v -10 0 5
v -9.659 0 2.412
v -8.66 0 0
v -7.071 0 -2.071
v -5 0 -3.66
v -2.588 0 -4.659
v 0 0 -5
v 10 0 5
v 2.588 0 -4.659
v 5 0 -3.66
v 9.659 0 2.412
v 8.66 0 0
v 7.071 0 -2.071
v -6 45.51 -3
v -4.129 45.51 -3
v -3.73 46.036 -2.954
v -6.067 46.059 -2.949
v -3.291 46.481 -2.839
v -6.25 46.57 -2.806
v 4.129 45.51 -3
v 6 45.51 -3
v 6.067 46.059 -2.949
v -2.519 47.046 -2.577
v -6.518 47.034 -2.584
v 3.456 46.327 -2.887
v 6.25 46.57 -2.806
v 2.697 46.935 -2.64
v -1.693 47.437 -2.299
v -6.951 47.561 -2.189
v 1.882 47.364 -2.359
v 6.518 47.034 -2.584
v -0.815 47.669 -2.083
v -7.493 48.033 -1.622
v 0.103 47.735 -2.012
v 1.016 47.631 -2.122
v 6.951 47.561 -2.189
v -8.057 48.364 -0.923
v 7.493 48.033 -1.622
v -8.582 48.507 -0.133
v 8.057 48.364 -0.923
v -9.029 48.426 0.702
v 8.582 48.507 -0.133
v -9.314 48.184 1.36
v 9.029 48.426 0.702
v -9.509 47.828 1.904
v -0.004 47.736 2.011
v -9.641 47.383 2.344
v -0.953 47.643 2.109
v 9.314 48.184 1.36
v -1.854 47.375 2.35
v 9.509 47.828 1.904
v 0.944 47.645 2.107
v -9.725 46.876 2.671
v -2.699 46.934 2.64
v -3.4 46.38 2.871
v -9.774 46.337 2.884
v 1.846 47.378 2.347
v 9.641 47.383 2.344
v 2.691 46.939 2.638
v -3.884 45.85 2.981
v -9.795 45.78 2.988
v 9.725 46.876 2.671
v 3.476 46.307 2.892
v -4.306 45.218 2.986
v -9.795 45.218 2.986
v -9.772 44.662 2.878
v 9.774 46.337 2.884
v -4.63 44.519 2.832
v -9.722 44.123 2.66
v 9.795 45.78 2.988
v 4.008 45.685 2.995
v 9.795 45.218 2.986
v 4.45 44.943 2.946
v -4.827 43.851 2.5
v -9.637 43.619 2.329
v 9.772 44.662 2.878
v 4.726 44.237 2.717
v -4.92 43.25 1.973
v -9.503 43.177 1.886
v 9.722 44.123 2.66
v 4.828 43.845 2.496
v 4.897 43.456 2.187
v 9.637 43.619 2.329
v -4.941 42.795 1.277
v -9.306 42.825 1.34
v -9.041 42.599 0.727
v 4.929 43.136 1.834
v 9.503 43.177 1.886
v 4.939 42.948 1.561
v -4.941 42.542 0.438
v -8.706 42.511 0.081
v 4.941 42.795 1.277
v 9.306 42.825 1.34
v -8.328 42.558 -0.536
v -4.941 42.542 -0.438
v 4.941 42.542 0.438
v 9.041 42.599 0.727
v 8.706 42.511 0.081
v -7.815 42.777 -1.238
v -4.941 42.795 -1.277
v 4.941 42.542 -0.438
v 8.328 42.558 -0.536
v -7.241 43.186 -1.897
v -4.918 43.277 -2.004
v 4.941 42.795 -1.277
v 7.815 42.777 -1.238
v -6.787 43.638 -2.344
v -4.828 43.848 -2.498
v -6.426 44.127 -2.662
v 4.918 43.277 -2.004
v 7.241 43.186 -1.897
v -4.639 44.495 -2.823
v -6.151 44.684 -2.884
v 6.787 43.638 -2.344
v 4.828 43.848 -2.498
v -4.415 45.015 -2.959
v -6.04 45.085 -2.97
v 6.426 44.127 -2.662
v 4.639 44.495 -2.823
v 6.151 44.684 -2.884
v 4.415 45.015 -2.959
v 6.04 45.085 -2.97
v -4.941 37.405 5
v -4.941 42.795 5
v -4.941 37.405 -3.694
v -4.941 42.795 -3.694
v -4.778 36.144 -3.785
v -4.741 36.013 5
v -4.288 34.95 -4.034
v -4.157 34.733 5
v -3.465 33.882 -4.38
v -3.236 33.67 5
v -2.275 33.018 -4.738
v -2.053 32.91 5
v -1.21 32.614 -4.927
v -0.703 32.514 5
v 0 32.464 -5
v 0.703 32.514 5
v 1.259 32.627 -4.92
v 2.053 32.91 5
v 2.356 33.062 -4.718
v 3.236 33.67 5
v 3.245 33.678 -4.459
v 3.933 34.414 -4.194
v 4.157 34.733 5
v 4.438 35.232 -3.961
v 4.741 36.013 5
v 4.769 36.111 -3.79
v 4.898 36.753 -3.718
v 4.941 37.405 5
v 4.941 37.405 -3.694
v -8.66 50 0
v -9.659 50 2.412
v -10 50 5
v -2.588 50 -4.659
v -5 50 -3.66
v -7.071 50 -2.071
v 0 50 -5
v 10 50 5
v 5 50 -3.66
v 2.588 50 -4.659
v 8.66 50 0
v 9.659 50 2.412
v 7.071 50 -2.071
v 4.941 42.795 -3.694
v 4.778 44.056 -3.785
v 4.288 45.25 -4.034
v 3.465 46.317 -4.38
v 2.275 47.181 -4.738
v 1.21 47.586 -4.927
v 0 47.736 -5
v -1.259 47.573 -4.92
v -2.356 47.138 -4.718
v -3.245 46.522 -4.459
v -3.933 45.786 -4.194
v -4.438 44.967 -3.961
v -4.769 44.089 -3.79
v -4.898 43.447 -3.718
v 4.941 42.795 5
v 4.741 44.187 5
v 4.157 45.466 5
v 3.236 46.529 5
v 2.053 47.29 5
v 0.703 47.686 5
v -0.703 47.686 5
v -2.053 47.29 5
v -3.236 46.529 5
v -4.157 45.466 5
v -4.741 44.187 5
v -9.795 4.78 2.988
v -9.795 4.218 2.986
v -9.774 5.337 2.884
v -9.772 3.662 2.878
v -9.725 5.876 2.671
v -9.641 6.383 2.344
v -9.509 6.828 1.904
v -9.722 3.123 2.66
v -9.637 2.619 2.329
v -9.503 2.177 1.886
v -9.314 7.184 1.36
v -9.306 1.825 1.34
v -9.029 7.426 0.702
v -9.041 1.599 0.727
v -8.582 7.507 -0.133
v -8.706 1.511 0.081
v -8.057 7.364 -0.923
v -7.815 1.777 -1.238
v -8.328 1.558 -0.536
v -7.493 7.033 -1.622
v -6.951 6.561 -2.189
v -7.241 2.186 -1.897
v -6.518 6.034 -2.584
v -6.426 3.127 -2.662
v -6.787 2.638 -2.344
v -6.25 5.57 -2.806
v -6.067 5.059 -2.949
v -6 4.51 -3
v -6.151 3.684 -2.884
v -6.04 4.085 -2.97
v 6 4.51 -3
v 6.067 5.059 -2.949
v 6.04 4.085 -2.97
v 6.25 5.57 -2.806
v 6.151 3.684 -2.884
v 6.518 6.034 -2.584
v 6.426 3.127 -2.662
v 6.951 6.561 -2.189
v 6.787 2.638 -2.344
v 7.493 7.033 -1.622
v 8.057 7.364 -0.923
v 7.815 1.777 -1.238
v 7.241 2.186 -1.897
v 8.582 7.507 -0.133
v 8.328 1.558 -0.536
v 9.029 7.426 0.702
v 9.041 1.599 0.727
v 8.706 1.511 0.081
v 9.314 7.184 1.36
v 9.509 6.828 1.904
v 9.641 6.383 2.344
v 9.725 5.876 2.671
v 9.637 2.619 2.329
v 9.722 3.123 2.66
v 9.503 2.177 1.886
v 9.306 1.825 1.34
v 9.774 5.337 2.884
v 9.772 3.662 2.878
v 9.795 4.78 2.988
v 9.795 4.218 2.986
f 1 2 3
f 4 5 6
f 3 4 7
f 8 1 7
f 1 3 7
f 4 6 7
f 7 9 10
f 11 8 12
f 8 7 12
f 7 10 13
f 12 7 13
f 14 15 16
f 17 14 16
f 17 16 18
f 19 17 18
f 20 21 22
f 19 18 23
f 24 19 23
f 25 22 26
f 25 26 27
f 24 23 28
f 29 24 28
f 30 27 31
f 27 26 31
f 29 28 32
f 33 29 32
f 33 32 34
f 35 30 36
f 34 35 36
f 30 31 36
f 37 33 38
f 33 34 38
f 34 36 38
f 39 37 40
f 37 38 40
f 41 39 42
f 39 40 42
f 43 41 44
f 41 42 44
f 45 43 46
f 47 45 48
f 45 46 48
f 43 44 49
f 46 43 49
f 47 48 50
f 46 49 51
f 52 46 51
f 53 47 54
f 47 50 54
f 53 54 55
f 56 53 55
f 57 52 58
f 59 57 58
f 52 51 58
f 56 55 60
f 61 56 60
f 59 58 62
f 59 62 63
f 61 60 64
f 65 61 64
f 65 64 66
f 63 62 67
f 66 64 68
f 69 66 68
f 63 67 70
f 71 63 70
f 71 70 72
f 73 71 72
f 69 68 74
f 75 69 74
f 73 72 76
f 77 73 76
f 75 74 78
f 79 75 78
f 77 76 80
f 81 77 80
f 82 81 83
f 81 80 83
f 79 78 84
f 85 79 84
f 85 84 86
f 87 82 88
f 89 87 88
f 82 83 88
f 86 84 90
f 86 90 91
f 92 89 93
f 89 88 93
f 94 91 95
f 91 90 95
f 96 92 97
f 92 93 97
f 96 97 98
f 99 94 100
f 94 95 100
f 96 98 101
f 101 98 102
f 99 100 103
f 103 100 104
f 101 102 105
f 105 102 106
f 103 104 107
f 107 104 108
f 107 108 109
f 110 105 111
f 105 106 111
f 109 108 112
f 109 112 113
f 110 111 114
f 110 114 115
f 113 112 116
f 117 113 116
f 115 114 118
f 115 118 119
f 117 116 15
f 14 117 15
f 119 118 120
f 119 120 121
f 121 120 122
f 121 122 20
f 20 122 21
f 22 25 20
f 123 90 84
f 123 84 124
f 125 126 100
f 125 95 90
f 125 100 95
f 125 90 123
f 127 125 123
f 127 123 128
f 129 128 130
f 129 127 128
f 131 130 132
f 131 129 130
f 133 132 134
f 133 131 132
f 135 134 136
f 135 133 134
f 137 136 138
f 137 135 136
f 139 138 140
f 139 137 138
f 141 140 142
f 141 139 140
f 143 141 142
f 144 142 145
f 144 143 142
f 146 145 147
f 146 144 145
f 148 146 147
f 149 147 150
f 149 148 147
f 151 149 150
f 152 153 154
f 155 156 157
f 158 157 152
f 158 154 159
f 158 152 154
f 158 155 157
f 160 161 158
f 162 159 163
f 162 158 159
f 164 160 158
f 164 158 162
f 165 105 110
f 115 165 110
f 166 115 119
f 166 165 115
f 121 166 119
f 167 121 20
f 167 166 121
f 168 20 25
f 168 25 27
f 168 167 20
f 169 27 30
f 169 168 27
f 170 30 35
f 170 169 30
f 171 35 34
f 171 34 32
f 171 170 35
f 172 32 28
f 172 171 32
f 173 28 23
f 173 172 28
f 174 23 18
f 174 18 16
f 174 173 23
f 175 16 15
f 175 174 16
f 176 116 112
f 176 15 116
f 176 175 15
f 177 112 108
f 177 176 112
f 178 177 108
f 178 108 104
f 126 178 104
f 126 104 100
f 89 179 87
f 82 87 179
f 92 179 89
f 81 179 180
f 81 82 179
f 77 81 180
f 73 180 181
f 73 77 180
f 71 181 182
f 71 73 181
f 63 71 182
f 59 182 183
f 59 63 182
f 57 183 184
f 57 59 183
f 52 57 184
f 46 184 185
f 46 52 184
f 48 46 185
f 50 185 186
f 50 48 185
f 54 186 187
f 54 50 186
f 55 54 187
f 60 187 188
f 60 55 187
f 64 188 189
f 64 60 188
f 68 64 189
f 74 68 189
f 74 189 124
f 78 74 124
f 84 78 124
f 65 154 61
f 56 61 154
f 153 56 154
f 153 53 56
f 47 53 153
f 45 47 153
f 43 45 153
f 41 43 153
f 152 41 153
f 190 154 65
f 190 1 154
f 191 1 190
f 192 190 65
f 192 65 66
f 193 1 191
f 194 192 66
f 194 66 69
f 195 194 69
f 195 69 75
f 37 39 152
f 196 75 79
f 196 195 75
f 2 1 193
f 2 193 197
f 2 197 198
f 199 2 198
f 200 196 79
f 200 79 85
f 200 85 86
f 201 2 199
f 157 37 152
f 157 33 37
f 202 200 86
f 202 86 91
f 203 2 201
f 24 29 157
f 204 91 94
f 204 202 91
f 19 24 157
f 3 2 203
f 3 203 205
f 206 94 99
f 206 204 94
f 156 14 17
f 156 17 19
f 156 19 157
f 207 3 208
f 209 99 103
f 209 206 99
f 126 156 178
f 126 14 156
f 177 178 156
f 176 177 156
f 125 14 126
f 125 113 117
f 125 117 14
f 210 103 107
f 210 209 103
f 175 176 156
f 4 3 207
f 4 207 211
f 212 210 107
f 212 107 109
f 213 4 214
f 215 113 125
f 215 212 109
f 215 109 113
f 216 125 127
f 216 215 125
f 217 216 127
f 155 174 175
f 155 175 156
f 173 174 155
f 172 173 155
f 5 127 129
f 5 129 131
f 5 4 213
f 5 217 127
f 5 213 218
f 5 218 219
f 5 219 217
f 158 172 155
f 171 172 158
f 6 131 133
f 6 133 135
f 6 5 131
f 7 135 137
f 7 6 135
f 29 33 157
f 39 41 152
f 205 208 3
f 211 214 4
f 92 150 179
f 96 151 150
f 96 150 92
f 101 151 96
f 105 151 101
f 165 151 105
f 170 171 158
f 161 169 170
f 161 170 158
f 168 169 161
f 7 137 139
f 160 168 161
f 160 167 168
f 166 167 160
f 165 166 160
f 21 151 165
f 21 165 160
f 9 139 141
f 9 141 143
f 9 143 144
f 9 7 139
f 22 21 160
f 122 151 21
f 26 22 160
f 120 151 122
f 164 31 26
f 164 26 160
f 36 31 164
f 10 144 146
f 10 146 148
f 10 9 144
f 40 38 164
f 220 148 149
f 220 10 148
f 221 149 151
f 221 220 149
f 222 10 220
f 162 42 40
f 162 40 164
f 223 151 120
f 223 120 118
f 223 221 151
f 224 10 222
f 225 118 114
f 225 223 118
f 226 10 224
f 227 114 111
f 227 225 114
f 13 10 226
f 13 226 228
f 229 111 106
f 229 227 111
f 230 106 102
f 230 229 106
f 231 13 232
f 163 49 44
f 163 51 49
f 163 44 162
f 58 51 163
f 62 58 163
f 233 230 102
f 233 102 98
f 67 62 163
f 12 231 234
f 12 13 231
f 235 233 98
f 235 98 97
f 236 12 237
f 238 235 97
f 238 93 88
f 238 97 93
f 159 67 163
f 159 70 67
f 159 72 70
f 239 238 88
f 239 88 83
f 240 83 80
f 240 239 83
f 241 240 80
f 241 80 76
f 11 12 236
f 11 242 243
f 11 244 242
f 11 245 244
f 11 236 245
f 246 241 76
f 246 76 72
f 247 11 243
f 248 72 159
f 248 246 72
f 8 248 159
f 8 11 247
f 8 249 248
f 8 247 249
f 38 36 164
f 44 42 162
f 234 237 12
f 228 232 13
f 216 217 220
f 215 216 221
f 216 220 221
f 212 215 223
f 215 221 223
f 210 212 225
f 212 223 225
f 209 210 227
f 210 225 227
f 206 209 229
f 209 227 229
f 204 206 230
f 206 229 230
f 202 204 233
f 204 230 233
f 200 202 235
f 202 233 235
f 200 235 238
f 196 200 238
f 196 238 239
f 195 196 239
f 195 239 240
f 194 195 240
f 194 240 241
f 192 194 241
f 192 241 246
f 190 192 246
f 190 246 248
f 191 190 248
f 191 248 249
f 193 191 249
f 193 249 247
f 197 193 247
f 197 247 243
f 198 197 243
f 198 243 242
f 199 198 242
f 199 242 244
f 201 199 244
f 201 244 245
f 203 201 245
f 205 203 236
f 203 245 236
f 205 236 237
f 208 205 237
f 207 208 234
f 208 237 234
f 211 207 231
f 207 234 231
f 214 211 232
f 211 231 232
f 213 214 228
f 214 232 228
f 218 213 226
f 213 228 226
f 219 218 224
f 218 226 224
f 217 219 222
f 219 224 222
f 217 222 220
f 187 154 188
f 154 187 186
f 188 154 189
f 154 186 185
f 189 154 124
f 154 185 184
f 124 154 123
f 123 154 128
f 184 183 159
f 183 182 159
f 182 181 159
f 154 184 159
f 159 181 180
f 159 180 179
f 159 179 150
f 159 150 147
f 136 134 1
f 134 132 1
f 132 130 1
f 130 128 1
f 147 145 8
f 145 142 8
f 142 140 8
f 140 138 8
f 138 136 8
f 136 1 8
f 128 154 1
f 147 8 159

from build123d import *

# Parameters (mm, degrees)
SKETCH1_W           = 20
SKETCH1_H           = 10
BOSS_EXTRUDE1_DEPTH = 50
SKETCH2_R           = 3
CUT_EXTRUDE1_DEPTH  = 55.083269132
CUT_EXTRUDE2_DEPTH  = 14
LPATTERN1_COUNT     = 2
LPATTERN1_PITCH     = 41
FILLET1_DEPTH       = 50


with BuildPart() as part:
    # Sketch1 → Boss-Extrude1 (new body)
    with BuildSketch(Plane(origin=(0, 0, 0), x_dir=(1, 0, 0), z_dir=(0, 1, 0))):
        Rectangle(SKETCH1_W, SKETCH1_H)
    extrude(amount=BOSS_EXTRUDE1_DEPTH)

    # Sketch2 → Cut-Extrude1 (cut, through all)
    with BuildSketch(Plane(origin=(10, 0, 0), x_dir=(0, 0, -1), z_dir=(1, 0, 0))):
        with Locations((0, 4.509775146)):
            Circle(SKETCH2_R)
    cut_extrude1 = extrude(amount=-CUT_EXTRUDE1_DEPTH, mode=Mode.SUBTRACT)

    # Sketch3 → Cut-Extrude2 (cut)
    with BuildSketch(Plane(origin=(0, 0, -5), x_dir=(-1, 0, 0), z_dir=(0, 0, -1))):
        with BuildLine():
            Line((-4.941150344, 37.404706109), (-4.941150344, 42.795051939))
            ThreePointArc((-4.941150344, 42.795051939), (0, 47.736202283), (4.941150344, 42.795051939))
            Line((4.941150344, 42.795051939), (4.941150344, 37.404706109))
            ThreePointArc((4.941150344, 37.404706109), (0, 32.463555765), (-4.941150344, 37.404706109))
        make_face()
    extrude(amount=-CUT_EXTRUDE2_DEPTH, mode=Mode.SUBTRACT)

    # LPattern1: Cut-Extrude1 ×2
    with Locations(*[(0, i * LPATTERN1_PITCH, 0) for i in range(1, LPATTERN1_COUNT)]):
        add(cut_extrude1, mode=Mode.SUBTRACT)

    # Fillet1: read off the stored shape, not the designer's step
    # Fillet1 outline → Fillet1 (cut)
    with BuildSketch(Plane(origin=(0, 0, 0), x_dir=(1, 0, 0), z_dir=(0, 1, 0))):
        with BuildLine():
            ThreePointArc((0, 5), (7.071067812, 2.071067812), (10, -5))
            Line((10, -5), (10, 5))
            Line((10, 5), (0, 5))
        make_face()
        with BuildLine():
            Line((0, 5), (-10, 5))
            Line((-10, 5), (-10, -5))
            ThreePointArc((-10, -5), (-7.071067812, 2.071067812), (0, 5))
        make_face()
    extrude(amount=FILLET1_DEPTH, mode=Mode.SUBTRACT)


solid = part.part
